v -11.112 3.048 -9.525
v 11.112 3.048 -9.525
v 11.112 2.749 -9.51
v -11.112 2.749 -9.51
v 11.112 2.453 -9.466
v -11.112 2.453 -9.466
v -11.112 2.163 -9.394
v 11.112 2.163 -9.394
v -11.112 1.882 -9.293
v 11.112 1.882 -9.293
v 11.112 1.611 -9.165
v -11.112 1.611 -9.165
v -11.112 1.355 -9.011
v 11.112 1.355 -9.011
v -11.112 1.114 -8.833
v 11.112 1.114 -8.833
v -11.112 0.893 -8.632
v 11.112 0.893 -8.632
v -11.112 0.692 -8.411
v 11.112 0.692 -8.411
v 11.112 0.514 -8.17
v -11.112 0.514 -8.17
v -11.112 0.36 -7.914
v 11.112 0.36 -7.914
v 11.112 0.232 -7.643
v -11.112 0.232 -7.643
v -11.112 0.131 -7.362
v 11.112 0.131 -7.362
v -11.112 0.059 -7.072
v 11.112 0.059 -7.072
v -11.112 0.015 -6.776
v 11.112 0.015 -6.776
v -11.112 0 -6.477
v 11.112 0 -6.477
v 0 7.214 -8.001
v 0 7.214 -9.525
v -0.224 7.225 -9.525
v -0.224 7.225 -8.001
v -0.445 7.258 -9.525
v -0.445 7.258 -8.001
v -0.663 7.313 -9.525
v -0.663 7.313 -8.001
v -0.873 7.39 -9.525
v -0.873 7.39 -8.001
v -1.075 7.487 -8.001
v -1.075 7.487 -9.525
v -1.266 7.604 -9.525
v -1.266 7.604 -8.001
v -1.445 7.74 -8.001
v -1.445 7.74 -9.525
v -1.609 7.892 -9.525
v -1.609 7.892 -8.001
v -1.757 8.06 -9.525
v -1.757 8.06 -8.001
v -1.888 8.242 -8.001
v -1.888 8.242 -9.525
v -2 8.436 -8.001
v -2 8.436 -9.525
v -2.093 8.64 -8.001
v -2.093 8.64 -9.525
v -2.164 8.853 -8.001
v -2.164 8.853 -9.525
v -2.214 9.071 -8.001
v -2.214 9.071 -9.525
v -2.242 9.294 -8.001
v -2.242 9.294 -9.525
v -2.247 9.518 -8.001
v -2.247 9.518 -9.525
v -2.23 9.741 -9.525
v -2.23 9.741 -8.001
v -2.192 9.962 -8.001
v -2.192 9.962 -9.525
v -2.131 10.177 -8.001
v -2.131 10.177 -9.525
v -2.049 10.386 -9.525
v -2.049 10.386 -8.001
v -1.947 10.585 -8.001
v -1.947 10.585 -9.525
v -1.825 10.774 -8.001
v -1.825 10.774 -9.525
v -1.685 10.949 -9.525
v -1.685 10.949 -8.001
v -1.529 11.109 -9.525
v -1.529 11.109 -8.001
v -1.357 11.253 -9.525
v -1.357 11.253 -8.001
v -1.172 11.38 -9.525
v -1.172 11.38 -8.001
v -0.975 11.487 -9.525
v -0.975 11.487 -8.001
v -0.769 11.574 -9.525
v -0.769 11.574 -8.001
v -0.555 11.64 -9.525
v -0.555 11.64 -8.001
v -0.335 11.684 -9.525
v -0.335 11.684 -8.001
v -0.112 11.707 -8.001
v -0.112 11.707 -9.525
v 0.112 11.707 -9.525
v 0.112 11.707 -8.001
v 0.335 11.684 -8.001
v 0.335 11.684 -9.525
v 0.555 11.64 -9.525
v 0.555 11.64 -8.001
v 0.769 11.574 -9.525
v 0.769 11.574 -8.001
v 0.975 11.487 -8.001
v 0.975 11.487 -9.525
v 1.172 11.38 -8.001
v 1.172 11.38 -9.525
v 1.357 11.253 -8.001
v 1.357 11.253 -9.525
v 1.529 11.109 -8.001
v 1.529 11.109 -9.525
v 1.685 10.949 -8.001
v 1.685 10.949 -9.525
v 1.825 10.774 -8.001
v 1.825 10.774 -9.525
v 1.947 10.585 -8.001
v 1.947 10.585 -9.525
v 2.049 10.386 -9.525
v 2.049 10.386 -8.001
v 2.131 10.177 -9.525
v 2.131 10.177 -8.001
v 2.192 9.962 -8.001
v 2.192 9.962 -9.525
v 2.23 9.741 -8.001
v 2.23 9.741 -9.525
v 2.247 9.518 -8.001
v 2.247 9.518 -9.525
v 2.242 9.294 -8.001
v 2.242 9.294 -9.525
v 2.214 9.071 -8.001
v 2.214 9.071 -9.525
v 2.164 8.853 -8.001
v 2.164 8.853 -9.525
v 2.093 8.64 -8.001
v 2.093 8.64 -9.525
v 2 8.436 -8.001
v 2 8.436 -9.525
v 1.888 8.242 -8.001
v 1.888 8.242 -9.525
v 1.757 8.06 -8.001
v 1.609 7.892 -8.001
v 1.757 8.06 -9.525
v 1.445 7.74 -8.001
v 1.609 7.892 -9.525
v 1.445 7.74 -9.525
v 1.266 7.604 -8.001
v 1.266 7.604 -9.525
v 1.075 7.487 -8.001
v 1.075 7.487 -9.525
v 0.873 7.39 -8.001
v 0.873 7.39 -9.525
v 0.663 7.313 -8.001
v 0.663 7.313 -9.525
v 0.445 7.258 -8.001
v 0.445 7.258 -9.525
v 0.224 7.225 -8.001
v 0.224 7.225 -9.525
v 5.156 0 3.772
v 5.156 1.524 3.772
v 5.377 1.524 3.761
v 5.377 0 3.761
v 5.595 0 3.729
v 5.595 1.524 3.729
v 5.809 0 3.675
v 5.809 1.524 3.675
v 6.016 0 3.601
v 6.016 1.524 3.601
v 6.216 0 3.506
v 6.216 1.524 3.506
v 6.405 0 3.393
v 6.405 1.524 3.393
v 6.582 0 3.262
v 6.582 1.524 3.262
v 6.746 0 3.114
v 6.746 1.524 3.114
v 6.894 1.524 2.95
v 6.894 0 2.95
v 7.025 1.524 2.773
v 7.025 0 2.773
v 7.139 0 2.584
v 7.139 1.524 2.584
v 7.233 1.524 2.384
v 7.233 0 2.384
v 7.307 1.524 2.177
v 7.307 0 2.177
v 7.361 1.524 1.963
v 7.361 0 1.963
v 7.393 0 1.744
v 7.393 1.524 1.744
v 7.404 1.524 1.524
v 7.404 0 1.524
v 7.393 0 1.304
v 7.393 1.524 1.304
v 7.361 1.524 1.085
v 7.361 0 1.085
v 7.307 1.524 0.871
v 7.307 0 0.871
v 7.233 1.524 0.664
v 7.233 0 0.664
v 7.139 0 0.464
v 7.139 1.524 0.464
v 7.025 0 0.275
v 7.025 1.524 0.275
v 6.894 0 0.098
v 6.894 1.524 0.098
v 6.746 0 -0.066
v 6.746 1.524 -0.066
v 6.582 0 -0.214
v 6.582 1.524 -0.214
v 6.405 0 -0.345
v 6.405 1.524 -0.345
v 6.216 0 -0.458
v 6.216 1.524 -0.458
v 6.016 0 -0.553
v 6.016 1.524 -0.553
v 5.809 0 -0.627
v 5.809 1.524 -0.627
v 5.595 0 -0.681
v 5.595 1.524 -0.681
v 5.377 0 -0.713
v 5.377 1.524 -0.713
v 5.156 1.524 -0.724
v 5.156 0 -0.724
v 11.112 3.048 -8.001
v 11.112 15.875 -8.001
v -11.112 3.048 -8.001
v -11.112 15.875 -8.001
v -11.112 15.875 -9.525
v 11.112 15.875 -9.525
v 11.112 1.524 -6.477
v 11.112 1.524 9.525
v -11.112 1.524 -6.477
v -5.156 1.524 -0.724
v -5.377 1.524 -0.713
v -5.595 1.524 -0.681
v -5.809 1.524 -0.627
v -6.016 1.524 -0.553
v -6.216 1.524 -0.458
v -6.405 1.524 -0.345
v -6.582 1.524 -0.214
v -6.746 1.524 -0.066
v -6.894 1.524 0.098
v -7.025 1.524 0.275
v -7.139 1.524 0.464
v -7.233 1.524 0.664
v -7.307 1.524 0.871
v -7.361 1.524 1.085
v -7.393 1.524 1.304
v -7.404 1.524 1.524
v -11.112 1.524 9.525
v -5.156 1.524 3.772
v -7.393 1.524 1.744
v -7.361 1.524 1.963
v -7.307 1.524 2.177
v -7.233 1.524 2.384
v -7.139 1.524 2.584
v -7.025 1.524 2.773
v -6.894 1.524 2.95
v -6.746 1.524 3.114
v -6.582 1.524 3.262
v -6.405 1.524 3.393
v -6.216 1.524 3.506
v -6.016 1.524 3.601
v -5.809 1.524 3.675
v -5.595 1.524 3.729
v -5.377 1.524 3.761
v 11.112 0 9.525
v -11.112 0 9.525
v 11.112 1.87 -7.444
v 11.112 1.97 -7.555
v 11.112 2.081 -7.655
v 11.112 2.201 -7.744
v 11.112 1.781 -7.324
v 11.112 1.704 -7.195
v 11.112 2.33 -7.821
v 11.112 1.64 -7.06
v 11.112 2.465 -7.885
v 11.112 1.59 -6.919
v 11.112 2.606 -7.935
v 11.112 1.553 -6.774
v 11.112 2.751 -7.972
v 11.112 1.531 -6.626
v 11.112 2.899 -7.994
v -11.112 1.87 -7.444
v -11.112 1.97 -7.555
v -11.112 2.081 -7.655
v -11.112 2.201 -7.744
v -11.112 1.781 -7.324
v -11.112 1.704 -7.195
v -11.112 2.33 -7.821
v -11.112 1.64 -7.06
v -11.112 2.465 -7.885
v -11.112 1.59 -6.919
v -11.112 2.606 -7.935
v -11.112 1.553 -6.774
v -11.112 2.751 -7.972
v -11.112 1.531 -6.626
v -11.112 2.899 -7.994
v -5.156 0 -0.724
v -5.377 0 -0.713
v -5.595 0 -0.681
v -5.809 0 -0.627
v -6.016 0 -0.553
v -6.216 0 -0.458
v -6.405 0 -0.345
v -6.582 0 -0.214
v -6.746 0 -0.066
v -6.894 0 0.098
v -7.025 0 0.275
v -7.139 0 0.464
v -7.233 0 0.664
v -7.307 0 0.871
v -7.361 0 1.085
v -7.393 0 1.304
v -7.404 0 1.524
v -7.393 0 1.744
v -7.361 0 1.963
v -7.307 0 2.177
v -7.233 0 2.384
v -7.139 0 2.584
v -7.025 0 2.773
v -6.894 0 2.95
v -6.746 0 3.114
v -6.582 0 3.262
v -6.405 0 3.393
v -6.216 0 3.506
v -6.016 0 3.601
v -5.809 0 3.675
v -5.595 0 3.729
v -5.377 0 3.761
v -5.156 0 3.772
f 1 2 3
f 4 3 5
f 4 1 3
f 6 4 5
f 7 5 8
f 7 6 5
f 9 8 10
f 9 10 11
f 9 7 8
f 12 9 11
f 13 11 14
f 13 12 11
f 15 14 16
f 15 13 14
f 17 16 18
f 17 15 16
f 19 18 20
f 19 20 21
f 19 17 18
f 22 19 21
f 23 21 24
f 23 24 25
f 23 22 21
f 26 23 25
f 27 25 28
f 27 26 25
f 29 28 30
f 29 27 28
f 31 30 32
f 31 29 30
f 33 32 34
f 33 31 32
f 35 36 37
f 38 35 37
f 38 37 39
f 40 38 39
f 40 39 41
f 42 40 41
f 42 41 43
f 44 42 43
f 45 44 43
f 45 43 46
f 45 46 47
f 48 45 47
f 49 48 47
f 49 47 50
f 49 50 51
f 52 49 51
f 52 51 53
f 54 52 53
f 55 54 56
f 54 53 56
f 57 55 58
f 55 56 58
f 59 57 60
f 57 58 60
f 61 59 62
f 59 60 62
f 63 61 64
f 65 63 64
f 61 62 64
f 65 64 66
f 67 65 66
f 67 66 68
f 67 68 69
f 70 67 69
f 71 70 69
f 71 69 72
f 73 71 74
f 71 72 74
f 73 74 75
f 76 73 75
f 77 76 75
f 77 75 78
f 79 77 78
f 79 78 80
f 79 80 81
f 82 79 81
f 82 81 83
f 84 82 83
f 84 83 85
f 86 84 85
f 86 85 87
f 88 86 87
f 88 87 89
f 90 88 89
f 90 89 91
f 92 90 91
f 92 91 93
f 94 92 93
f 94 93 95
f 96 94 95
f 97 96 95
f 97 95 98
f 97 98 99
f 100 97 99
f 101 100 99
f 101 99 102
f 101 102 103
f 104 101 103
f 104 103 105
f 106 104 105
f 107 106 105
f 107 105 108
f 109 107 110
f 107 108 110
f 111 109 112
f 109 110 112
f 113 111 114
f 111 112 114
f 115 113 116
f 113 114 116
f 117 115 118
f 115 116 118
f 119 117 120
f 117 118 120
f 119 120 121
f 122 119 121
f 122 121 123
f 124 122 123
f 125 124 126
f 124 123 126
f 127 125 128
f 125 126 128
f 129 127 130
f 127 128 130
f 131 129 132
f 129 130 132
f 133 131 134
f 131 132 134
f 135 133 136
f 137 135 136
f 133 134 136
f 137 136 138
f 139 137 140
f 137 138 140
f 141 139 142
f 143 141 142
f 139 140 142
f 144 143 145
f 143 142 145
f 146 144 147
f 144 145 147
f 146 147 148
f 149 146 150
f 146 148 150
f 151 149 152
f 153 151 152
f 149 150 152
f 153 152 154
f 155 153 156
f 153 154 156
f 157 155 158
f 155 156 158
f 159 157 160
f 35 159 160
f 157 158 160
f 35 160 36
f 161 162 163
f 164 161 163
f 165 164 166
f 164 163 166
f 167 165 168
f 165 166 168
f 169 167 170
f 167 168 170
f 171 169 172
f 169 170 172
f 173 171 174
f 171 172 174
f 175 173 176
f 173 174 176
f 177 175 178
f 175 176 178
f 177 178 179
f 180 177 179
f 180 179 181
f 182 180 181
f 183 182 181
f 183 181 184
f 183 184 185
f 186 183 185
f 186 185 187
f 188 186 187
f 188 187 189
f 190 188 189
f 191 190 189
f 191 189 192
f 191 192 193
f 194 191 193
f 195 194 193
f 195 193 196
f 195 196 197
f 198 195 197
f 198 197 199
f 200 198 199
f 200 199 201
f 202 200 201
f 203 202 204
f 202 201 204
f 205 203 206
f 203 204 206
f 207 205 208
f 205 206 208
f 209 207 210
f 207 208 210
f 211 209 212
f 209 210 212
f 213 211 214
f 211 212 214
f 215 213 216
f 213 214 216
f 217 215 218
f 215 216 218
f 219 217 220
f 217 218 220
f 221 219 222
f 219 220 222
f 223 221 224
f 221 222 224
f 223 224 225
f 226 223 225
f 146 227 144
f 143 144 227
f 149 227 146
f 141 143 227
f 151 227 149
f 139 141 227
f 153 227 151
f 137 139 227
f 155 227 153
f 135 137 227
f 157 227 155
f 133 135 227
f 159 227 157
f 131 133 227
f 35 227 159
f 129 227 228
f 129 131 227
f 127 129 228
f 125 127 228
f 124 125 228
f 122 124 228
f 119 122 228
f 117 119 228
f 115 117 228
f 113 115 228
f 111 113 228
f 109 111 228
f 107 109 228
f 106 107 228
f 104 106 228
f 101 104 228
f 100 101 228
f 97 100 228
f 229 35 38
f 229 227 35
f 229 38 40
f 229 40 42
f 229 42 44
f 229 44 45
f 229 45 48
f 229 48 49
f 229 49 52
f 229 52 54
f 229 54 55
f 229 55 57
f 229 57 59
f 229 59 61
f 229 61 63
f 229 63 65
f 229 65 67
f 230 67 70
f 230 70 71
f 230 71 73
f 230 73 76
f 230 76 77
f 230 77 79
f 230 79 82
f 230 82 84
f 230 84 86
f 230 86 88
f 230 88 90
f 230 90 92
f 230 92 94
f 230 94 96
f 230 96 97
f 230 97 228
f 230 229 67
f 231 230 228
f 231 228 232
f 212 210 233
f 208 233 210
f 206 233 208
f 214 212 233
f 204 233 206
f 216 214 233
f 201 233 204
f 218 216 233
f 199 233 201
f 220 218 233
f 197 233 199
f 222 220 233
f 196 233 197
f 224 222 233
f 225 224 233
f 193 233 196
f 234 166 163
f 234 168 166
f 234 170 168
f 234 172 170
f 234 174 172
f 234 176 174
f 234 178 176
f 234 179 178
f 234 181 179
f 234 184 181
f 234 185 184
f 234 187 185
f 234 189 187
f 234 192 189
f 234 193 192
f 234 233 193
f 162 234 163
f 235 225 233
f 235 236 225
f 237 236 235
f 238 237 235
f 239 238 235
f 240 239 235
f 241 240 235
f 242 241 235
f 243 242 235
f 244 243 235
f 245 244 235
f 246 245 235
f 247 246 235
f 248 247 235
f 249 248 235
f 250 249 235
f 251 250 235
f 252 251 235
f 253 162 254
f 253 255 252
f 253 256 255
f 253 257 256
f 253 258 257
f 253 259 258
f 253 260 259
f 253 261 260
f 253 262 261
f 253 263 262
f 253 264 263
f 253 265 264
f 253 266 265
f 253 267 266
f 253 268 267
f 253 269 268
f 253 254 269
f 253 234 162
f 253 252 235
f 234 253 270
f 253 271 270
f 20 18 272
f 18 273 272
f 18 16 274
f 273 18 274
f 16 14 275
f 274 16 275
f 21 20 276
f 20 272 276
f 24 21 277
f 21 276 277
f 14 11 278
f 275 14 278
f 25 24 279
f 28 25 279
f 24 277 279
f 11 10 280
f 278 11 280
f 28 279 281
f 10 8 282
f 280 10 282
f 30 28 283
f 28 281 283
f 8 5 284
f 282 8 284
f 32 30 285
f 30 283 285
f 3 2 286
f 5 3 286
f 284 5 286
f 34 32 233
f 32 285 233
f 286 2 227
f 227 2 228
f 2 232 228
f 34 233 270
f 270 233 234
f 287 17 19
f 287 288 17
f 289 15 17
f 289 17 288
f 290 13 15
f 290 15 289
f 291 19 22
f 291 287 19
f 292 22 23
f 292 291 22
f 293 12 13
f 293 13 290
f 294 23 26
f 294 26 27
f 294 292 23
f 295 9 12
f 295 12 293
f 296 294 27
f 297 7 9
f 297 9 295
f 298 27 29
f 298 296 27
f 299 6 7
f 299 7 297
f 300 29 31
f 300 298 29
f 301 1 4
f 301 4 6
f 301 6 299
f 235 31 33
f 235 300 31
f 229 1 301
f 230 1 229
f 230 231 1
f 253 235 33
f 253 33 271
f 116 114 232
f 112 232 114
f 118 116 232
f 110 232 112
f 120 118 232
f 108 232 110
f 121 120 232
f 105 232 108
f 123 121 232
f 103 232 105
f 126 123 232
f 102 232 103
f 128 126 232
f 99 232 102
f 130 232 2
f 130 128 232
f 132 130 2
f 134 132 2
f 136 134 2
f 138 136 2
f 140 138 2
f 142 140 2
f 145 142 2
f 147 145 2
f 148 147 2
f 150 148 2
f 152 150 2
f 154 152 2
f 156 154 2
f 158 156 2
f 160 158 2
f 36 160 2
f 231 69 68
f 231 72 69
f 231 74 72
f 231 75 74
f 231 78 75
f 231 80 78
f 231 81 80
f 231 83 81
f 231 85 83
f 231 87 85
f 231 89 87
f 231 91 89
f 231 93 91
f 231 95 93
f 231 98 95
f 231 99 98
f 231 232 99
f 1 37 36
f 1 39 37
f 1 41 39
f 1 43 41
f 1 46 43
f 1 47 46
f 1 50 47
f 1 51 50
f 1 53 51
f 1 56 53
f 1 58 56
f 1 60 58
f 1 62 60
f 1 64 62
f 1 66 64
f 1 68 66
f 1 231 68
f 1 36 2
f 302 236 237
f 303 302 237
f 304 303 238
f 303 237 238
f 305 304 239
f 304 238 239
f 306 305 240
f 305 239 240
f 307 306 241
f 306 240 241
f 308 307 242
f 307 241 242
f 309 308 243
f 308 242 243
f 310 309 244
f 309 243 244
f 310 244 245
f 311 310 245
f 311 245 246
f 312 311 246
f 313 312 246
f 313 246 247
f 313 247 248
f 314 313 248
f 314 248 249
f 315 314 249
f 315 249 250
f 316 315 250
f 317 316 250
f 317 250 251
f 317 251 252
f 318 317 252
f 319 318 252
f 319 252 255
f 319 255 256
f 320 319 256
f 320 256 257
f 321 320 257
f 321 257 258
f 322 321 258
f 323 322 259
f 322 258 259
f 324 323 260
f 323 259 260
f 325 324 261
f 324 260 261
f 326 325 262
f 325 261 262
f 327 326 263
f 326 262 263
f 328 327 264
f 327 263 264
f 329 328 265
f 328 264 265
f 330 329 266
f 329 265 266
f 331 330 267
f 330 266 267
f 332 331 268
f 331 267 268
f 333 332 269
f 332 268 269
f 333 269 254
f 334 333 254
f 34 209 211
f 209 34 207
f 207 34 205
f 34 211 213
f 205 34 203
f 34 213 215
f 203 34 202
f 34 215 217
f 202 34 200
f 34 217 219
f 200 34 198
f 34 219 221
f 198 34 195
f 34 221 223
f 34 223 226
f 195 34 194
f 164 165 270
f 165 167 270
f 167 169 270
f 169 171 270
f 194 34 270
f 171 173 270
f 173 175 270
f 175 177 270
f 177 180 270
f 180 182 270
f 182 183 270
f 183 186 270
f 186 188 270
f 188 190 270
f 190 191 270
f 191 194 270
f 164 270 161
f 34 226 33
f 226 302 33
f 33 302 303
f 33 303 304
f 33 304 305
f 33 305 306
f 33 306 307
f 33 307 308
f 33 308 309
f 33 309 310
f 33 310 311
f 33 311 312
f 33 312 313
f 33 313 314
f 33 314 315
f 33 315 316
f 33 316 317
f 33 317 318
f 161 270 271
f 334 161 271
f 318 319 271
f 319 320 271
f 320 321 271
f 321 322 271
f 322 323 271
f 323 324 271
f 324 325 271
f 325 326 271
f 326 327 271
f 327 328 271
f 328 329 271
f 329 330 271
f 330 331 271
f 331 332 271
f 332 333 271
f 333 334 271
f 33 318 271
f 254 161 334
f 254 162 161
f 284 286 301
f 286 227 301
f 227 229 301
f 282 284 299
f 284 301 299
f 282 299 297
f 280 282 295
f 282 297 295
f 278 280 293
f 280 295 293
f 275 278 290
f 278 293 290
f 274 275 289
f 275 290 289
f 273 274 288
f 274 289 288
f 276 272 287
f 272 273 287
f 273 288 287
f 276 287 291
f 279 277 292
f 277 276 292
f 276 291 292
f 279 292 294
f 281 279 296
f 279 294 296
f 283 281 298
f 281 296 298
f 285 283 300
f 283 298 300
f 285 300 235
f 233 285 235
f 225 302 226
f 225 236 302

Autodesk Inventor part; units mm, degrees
ref_plane "YZ Plane" through (0, 0, 0) normal (1, 0, 0) x (0, 1, 0)
ref_plane "XZ Plane" through (0, 0, 0) normal (0, 1, 0) x (-1, 0, 0)
ref_plane "XY Plane" through (0, 0, 0) normal (0, 0, 1) x (1, 0, 0)
sketch "Sketch1" plane through (0, 0, 0) normal (0, 1, 0) x (-1, 0, 0)
  line L0 (11.1125, 9.525) -> (-11.1125, 9.525)
  line L1 (-11.1125, 9.525) -> (-11.1125, -9.525)
  line L2 (-11.1125, -9.525) -> (11.1125, -9.525)
  line L3 (11.1125, -9.525) -> (11.1125, 9.525)
  line L4 (11.1125, 9.525) -> (-11.1125, -9.525) construction
  line L5 (-11.1125, 9.525) -> (11.1125, -9.525) construction
  point P0 (0, 0)
  dimension "d0" = 22.225
  dimension "d1" = 19.05
extrude "Plate1" add sketch "Sketch1" along normal blind 1.524
sketch "Sketch2" plane through (-11.1125, 0, -8.001) normal (0, 0, -1) x (-1, 0, 0)
  line L0 (-22.225, 0) -> (0, 0)
  line L1 (0, 0) -> (0, 15.875)
  line L2 (0, 15.875) -> (-22.225, 15.875)
  line L3 (-22.225, 15.875) -> (-22.225, 0)
edge flange "Flange1" height 15.875 angle 90 thickness 1.524 bend radius 1.524 thickness toward (0, 0, -1) relief tear relief width 1.524 relief depth 0.762 edges at (0, 1.524, -9.525) wall of the first edge with corners at (11.1125, 0, -8.001) (-11.1125, 0, -8.001) (-11.1125, 15.875, -8.001) (11.1125, 15.875, -8.001)
bend "Bend1"
corner "Corner1"
sketch "Sketch3" plane through (0, 1.524, 0) normal (0, 1, 0) x (1, 0, 0)
  line L0 (11.1125, 6.477) -> (-11.1125, 6.477) projected
  line L1 (-11.1125, -9.525) -> (-11.1125, 6.477) projected
  line L2 (11.1125, -9.525) -> (-11.1125, -9.525) projected
  line L3 (11.1125, 6.477) -> (11.1125, -9.525) projected
  line L4 (-11.1125, -1.524) -> (11.1125, -1.524) construction
  line L5 (0, 6.477) -> (0, -9.525) construction
  circle A0 centre (0, -1.524) radius 2.2479
  line L6 (-5.1562, -1.524) -> (5.1562, -1.524) construction
  line L7 (-5.1562, 0.7239) -> (5.1562, 0.7239)
  line L8 (5.1562, -3.7719) -> (-5.1562, -3.7719)
  arc A1 (-5.1562, 0.7239) -> (-5.1562, -3.7719) centre (-5.1562, -1.524) ccw
  arc A2 (5.1562, -3.7719) -> (5.1562, 0.7239) centre (5.1562, -1.524) ccw
  point P0 (0, 0)
  dimension "d13" = 16.002
  dimension "d14" = 22.225
  dimension "d24" = 4.4958
  dimension "d25" = 3.7084
sketch "Sketch4" plane through (-11.1125, 15.875, -8.001) normal (0, 0, 1) x (1, 0, 0)
  line L0 (0, -12.827) -> (22.225, -12.827) projected
  line L1 (22.225, 0) -> (22.225, -12.827) projected
  line L2 (22.225, 0) -> (0, 0) projected
  line L3 (0, 0) -> (0, -12.827) projected
  line L4 (0, -6.4135) -> (22.225, -6.4135) construction
  line L5 (22.225, 0) -> (22.225, -12.827) construction
  line L6 (11.1125, -12.827) -> (11.1125, 0) construction
  line L7 (22.225, 0) -> (0, 0) construction
  point P0 (11.1125, -15.875)
  point P1 (11.1125, -6.4135)
  dimension "d15" = 22.225
  dimension "d16" = 12.827
hole "Hole1" at (0, 9.4615, -8.001) direction (0, 0, -1) diameter 4.4958 depth 1.524 tip angle 118 clearance for "Flat Head Machine Screw (82)" size "#8" standard "Ansi Unified Screw Threads"
extrude "Cut1" cut sketch "Sketch3" against normal blind 1.524 contours A0 | A0 L7 A2 L8 | A0 L8 A1 L7
sketch "Sketch7" plane through (11.1125, 15.875, -9.525) normal (0, 0, -1) x (-1, 0, 0)
  line L0 (0, 0) -> (22.225, 0) projected
  line L1 (22.225, -15.875) -> (0, -15.875) projected
  line L2 (0, -12.827) -> (22.225, -12.827) projected
  point P0 (11.1125, -15.875)
  dimension "d28" = 15.875
  dimension "d29" = 12.827
  dimension "d30" = 22.225
sketch "Sketch8" plane through (0, 0, 0) normal (0, -1, 0) x (1, 0, 0)
  arc A0 (-5.1562, 3.7719) -> (-5.1562, -0.7239) centre (-5.1562, 1.524) ccw projected
  line L0 (-5.1562, 3.7719) -> (5.1562, 3.7719) projected
  arc A1 (5.1562, -0.7239) -> (5.1562, 3.7719) centre (5.1562, 1.524) ccw projected
  line L1 (5.1562, -0.7239) -> (-5.1562, -0.7239) projected
  line L2 (-11.1125, -6.477) -> (11.1125, -6.477) projected
  line L3 (11.1125, 9.525) -> (11.1125, -6.477) projected
  line L4 (-11.1125, 9.525) -> (11.1125, 9.525) projected
  line L5 (-11.1125, -6.477) -> (-11.1125, 9.525) projected
  line L6 (11.1125, -9.525) -> (-11.1125, -9.525) projected
  line L7 (11.1125, -6.477) -> (11.1125, -9.525) projected
  line L8 (-11.1125, -6.477) -> (11.1125, -6.477) projected
  line L9 (-11.1125, -9.525) -> (-11.1125, -6.477) projected
  point P0 (0, 0)
  dimension "d31" = 19.05
  dimension "d32" = 16.002
sketch "Sketch9" plane through (0, 1.524, 0) normal (0, 1, 0) x (1, 0, 0)
  arc A0 (5.1562, -3.7719) -> (5.1562, 0.7239) centre (5.1562, -1.524) ccw projected
  arc A1 (-5.1562, 0.7239) -> (-5.1562, -3.7719) centre (-5.1562, -1.524) ccw projected
  line L0 (5.1562, -3.7719) -> (-5.1562, -3.7719) projected
  line L1 (-5.1562, 0.7239) -> (5.1562, 0.7239) projected
  circle A2 centre (0, -1.524) radius 2.2479
  point P0 (0, 0)
  dimension "d34" = 5.1562
sketch "Sketch10" plane through (-11.1125, 15.875, -9.525) normal (0, 1, 0) x (1, 0, 0)
  line L0 (22.225, -19.05) -> (0, -19.05) projected
  line L1 (22.225, 0) -> (0, 0) projected
  line L2 (0, -1.524) -> (0, 0) projected
  line L3 (0, -1.524) -> (0, -3.048) projected
  line L4 (0, -19.05) -> (0, -3.048) projected
  line L5 (0, 0) -> (7.1374, 0)
  line L6 (7.1374, 0) -> (7.1374, -19.05)
  line L7 (7.1374, -19.05) -> (0, -19.05)
  line L8 (0, -19.05) -> (0, 0)
  line L9 (22.225, 0) -> (15.0876, 0)
  line L10 (15.0876, 0) -> (15.0876, -19.05)
  line L11 (15.0876, -19.05) -> (22.225, -19.05)
  line L12 (22.225, -19.05) -> (22.225, 0)
  point P0 (11.1125, -9.525)
  dimension "d35" = 7.1374
  dimension "d36" = 7.1374
equation "\"d22\" = Thickness"
equation "\"d26\" = Thickness"
equation "\"d36\" = d35"
equation "\"d3\" = BendReliefWidth"
equation "\"d4\" = BendReliefDepth"
equation "\"d5\" = MinimumRemnant"
equation "\"d6\" = BendRadius"
equation "\"d9\" = BendRadius"
equation "\"d10\" = CornerReliefSize"
equation "\"d11\" = GapSize"
equation "\"d12\" = JacobiRadiusSize"
equation "\"BendRadius\" = Thickness"
equation "\"BendReliefWidth\" = Thickness"
equation "\"BendReliefDepth\" = 0.5 * Thickness"
equation "\"CornerReliefSize\" = 4 * Thickness"
equation "\"MinimumRemnant\" = 2 * Thickness"
equation "\"TransitionRadius\" = BendRadius"
equation "\"JacobiRadiusSize\" = BendRadius"
equation "\"GapSize\" = Thickness"
equation "\"d2\" = BendRadius"
equation "\"Thickness\" = 1.524"
properties part number "Bracket (15275A53)" material "Steel"
